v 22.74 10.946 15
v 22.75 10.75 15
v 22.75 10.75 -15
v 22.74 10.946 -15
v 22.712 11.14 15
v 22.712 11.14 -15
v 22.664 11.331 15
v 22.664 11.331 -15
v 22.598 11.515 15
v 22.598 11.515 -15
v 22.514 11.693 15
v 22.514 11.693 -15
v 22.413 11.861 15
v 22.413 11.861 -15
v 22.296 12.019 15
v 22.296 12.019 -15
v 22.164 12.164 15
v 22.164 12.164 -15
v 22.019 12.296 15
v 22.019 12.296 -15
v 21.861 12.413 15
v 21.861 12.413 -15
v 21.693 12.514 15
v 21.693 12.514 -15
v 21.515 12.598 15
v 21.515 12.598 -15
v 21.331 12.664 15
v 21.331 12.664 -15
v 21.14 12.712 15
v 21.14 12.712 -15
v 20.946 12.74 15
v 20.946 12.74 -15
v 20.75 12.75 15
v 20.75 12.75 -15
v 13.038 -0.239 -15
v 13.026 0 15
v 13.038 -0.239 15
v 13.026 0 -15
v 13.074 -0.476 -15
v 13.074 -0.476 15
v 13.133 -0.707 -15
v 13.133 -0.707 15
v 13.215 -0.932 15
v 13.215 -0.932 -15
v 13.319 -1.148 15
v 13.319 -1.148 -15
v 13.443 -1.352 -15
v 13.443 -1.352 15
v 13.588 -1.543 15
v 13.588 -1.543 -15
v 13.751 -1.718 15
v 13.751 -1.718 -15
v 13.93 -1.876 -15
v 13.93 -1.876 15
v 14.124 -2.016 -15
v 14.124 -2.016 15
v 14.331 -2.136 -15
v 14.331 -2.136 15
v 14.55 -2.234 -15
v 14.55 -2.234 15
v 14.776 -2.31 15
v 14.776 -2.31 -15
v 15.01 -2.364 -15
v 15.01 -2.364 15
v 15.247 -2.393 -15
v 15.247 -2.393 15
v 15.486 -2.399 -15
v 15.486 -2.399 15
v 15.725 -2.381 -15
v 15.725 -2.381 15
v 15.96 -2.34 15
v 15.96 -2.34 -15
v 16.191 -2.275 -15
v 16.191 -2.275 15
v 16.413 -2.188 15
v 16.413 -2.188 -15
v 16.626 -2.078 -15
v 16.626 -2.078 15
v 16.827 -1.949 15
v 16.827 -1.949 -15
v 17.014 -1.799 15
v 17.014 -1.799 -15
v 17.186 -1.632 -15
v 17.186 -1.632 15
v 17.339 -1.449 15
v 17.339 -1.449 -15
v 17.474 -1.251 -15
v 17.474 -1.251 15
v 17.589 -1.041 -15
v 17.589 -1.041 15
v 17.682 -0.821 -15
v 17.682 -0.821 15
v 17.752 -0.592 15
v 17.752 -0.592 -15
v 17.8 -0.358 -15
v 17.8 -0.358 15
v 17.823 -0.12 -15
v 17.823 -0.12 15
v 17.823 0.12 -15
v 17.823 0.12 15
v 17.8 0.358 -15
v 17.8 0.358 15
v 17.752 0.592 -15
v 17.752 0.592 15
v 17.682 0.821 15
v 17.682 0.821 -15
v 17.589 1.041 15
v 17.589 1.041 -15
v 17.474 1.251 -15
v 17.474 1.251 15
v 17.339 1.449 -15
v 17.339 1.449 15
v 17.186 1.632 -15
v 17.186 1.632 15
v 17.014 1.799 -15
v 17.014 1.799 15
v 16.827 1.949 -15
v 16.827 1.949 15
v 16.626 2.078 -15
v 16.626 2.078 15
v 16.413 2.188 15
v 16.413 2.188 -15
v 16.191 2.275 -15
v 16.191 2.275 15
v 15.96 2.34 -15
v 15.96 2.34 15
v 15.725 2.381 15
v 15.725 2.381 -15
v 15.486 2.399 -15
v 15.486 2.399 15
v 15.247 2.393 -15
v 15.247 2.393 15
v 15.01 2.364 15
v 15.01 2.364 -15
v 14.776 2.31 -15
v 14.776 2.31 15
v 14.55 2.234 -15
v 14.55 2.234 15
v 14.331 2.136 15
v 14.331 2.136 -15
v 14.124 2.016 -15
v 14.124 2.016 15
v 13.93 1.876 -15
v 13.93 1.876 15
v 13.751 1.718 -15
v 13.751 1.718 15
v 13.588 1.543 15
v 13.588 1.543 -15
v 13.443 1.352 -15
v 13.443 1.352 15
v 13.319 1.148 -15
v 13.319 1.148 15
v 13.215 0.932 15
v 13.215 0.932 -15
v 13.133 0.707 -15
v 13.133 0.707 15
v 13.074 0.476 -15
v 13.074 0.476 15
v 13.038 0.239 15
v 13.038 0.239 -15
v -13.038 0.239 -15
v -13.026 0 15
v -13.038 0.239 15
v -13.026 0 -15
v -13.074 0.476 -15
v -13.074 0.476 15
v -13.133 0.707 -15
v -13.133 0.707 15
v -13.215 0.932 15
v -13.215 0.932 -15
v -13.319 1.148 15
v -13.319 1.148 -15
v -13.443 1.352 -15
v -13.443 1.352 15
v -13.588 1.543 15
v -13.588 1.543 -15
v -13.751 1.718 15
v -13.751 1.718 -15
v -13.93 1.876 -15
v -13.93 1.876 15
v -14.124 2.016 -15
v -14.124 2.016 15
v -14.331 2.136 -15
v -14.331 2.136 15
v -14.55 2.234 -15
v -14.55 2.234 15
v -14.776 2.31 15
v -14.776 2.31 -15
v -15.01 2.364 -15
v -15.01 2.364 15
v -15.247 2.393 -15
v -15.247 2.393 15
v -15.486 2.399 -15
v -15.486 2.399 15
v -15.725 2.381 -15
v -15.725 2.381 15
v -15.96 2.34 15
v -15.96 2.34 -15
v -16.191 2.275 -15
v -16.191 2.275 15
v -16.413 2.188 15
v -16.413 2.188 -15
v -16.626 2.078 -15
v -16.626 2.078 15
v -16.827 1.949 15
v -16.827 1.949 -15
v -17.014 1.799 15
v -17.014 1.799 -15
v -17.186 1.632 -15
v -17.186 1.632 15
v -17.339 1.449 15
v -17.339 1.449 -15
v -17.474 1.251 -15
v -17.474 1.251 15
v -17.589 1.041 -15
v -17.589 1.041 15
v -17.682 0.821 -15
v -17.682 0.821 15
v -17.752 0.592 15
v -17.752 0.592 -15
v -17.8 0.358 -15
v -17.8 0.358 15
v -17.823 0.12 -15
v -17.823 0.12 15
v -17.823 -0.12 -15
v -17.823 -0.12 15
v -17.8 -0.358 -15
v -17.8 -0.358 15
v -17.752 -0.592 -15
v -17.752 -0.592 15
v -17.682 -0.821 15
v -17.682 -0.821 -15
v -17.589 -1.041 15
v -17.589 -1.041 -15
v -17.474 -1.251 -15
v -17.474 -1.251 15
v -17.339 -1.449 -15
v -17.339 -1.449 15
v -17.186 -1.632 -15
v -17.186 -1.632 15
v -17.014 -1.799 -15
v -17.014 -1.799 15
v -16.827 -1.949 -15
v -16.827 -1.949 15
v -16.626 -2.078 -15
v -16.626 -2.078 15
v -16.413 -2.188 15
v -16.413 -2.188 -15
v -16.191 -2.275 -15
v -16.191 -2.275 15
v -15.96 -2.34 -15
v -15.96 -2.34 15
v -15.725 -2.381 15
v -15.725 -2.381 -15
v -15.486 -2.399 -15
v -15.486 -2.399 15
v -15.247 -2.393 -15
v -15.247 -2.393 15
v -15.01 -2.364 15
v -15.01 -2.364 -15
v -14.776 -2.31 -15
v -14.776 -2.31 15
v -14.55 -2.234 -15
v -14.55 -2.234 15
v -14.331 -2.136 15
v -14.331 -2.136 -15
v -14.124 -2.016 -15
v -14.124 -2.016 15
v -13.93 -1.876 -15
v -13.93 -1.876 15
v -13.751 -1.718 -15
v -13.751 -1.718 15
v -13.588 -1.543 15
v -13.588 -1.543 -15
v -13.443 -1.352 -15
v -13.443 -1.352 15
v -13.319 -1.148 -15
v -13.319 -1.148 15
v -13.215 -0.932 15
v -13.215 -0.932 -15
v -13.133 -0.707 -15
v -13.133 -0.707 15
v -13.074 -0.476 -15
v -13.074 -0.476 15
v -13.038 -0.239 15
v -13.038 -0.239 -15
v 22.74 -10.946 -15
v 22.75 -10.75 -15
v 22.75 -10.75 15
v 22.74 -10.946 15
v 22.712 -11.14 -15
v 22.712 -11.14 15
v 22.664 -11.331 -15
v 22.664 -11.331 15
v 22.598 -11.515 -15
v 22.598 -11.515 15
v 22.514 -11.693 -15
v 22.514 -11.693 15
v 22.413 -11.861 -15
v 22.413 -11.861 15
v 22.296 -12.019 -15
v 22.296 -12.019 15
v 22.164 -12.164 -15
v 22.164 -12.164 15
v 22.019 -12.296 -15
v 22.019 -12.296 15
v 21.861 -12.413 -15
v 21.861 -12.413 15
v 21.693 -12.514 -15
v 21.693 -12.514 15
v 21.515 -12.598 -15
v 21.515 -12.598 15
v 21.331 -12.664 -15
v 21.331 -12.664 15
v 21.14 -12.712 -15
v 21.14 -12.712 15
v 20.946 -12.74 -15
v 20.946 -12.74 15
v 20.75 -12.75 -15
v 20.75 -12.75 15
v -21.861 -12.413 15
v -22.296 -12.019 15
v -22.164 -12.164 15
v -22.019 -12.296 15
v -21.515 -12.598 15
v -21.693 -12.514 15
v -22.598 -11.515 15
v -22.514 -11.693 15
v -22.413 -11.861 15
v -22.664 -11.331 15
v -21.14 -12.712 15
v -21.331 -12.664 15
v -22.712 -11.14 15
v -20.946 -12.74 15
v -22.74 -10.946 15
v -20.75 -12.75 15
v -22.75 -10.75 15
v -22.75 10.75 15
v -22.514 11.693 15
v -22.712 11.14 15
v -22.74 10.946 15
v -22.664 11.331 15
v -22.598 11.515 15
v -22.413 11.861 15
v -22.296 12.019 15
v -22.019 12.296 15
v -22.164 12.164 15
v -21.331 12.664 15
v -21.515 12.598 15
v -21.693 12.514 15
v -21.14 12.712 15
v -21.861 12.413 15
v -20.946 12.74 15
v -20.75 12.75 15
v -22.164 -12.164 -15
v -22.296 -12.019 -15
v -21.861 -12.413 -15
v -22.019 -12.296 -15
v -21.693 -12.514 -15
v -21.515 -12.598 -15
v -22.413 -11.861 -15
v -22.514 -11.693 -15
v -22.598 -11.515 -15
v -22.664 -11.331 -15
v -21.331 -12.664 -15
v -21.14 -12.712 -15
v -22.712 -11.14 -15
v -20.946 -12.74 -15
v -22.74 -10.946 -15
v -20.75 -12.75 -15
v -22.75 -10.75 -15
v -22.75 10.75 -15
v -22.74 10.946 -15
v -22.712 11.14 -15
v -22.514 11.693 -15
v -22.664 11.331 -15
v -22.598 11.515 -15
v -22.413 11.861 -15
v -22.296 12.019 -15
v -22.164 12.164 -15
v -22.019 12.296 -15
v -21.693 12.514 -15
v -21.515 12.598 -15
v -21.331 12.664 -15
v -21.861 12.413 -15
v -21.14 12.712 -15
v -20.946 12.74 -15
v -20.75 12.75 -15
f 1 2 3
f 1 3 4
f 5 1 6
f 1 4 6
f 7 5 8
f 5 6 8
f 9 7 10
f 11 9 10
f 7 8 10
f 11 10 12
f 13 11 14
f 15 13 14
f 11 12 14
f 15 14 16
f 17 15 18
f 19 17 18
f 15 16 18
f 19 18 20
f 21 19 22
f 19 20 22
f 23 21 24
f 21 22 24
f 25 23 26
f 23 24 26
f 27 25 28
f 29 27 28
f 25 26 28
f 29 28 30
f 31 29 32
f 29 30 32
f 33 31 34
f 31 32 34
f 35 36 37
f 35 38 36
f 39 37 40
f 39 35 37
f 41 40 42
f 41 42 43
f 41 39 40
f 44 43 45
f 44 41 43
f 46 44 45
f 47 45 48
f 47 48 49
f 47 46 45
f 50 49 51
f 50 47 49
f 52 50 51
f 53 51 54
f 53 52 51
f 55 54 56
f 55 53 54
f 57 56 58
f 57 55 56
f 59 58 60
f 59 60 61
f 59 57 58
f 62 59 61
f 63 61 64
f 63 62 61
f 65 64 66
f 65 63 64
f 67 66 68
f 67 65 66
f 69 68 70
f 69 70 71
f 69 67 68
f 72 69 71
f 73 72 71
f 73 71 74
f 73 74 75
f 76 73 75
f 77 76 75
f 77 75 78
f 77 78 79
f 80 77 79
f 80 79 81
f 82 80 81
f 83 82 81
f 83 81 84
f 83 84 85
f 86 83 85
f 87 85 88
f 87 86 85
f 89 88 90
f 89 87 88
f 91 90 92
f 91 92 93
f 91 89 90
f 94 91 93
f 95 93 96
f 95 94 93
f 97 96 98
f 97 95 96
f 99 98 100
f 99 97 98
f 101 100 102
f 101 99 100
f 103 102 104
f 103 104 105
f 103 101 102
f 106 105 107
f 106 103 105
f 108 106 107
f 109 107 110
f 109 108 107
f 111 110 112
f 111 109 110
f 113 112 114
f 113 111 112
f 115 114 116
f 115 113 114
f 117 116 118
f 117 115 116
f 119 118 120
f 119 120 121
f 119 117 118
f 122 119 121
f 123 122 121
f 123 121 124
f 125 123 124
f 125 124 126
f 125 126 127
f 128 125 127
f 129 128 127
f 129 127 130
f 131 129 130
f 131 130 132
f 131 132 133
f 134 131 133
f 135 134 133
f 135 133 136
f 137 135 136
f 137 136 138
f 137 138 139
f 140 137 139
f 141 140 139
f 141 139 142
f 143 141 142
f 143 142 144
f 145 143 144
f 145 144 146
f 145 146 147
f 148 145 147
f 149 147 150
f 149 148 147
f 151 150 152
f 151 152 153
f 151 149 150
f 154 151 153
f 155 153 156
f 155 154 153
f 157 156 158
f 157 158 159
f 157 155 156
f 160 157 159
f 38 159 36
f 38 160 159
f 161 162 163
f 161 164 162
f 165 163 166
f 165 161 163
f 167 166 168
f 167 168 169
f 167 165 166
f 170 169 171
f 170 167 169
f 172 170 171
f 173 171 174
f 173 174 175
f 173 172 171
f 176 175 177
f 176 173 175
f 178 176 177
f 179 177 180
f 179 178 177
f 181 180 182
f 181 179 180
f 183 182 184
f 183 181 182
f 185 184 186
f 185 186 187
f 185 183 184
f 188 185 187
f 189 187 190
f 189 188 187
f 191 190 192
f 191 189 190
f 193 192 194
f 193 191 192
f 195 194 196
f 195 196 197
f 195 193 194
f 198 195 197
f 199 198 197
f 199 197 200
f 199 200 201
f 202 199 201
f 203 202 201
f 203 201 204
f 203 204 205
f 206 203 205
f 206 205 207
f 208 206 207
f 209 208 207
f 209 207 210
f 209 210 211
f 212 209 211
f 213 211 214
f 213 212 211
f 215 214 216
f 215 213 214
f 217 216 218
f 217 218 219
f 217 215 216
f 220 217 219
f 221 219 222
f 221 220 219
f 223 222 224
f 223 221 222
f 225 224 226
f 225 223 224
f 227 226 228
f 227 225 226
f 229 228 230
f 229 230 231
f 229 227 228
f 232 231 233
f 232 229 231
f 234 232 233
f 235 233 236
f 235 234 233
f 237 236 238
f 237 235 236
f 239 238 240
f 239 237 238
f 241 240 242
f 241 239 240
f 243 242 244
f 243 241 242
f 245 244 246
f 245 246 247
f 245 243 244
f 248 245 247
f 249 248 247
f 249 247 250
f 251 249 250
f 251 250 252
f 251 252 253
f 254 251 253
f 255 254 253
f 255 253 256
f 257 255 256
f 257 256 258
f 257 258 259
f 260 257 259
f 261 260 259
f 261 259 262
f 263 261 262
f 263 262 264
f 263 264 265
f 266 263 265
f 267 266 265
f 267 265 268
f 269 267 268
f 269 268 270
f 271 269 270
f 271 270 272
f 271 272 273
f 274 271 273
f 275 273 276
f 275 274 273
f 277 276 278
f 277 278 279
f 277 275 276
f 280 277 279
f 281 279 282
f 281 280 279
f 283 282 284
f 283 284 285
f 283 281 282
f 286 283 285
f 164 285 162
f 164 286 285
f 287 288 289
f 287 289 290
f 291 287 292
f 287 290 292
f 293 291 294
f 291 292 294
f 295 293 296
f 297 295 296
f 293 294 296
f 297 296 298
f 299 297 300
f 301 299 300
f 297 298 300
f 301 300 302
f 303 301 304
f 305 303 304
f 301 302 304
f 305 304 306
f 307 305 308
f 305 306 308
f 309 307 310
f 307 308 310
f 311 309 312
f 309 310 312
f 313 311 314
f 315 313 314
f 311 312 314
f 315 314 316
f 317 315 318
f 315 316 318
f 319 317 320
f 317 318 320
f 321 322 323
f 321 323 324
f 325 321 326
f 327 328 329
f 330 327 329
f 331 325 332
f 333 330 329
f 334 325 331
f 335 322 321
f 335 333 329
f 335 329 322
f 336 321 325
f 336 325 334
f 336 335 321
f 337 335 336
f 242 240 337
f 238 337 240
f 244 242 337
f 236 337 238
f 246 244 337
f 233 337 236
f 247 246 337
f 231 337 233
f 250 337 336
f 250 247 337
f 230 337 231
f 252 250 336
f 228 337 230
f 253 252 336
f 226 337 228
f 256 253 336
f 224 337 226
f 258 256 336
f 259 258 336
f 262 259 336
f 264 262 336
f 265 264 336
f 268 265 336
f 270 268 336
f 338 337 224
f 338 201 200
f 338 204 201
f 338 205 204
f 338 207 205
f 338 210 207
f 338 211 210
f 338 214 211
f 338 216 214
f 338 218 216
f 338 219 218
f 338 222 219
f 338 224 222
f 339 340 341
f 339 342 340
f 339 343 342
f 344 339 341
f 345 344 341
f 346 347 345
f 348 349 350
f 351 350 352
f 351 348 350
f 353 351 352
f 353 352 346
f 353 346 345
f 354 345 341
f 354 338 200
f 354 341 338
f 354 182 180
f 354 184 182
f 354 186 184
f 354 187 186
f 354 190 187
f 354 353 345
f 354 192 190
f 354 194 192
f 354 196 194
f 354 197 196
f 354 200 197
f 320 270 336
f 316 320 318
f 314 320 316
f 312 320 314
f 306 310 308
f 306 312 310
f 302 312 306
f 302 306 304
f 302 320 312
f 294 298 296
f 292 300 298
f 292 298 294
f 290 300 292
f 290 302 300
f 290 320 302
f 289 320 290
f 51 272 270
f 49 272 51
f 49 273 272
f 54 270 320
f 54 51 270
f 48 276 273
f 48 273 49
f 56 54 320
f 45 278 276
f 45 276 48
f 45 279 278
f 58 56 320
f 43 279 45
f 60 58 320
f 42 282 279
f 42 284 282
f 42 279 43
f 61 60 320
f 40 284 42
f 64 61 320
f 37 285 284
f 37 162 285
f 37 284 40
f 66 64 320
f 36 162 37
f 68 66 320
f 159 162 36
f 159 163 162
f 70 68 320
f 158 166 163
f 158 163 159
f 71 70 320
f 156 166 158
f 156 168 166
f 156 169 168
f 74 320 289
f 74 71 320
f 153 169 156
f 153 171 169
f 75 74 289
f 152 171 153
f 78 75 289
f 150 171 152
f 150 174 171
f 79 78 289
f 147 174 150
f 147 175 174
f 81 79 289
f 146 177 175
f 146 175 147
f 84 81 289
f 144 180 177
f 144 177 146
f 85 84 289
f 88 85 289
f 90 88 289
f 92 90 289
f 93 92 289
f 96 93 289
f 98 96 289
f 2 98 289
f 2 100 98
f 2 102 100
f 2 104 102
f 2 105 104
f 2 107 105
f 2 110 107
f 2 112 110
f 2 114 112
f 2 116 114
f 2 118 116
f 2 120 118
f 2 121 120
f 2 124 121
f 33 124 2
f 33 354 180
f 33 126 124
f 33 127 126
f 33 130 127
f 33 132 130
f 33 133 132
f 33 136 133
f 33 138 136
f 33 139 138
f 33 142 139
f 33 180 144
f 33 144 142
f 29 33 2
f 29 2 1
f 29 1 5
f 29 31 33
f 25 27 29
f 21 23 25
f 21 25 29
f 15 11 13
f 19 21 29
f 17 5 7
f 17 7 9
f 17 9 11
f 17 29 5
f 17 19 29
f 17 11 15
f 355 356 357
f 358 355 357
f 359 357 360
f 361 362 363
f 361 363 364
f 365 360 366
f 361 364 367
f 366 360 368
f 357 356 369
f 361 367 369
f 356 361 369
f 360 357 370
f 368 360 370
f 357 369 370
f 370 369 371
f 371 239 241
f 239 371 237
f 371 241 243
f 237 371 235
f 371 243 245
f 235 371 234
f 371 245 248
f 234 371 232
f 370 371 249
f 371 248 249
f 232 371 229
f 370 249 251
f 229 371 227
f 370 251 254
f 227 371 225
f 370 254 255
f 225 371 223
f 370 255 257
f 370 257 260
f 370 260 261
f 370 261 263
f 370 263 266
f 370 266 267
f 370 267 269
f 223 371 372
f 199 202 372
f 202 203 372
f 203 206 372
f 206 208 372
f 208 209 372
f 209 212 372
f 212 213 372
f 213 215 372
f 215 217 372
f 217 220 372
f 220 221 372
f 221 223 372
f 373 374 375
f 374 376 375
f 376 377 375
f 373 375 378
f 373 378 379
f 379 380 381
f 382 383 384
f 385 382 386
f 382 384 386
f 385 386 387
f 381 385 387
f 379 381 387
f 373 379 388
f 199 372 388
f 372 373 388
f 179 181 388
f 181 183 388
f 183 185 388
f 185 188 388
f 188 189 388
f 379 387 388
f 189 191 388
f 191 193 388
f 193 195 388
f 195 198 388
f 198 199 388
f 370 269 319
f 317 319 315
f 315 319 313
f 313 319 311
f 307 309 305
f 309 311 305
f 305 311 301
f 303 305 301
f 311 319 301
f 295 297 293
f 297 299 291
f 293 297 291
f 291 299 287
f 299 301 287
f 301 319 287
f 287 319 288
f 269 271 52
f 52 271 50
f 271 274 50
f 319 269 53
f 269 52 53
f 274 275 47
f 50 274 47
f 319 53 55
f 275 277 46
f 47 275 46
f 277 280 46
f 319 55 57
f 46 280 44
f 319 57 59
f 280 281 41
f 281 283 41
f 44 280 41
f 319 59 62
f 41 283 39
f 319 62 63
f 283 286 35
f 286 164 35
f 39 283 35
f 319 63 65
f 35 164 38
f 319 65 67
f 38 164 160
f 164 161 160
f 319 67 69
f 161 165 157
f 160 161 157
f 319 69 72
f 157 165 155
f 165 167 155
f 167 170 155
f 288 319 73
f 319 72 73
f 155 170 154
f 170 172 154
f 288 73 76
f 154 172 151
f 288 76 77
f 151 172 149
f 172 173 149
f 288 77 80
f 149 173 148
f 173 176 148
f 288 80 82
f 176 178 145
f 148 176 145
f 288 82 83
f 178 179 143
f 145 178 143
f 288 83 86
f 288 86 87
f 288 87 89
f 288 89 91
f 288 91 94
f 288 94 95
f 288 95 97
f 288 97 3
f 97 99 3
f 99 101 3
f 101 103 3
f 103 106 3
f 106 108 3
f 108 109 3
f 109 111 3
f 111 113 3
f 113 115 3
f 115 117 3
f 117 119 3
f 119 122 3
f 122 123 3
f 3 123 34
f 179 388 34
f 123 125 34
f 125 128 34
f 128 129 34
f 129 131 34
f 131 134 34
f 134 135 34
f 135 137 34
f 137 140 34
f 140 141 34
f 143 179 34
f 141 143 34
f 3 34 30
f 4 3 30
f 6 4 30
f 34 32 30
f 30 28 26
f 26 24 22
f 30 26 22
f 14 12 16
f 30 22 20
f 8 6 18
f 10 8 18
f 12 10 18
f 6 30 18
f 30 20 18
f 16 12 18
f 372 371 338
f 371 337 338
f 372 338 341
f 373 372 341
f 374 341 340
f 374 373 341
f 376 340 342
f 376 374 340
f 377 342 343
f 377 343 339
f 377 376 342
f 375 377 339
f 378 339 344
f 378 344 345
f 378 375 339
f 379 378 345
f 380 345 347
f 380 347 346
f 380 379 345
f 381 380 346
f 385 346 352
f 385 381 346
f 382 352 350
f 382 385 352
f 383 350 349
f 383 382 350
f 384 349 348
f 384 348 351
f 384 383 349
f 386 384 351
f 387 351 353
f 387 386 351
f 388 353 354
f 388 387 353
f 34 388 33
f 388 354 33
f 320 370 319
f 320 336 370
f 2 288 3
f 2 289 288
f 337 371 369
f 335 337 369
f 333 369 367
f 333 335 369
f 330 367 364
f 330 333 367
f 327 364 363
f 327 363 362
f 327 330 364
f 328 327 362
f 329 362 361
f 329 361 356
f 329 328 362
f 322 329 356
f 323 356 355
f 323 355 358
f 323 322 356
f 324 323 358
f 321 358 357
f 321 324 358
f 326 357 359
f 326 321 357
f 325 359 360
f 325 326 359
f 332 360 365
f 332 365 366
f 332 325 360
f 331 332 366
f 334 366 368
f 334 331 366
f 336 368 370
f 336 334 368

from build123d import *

# Parameters (mm, degrees)
SKETCH1_W           = 45.5
SKETCH1_H           = 25.5
SKETCH1_R           = 2.4
BOSS_EXTRUDE1_DEPTH = 15
FILLET1_R           = 2


with BuildPart() as part:
    # Sketch1 → Boss-Extrude1 (new, symmetric)
    with BuildSketch(Plane.XY):
        Rectangle(SKETCH1_W, SKETCH1_H)
        with Locations((-15.426369863, 0)):
            Circle(SKETCH1_R, mode=Mode.SUBTRACT)
        with Locations((15.426369863, 0)):
            Circle(SKETCH1_R, mode=Mode.SUBTRACT)
    extrude(amount=BOSS_EXTRUDE1_DEPTH, both=True)

    # Fillet1
    fillet1_edges = [part.edges().sort_by_distance(p)[0] for p in [
        (-22.75, -12.75, 0),
        (22.75, -12.75, 0),
        (-22.75, 12.75, 0),
        (22.75, 12.75, 0),
    ]]
    fillet(fillet1_edges, radius=FILLET1_R)


solid = part.part
